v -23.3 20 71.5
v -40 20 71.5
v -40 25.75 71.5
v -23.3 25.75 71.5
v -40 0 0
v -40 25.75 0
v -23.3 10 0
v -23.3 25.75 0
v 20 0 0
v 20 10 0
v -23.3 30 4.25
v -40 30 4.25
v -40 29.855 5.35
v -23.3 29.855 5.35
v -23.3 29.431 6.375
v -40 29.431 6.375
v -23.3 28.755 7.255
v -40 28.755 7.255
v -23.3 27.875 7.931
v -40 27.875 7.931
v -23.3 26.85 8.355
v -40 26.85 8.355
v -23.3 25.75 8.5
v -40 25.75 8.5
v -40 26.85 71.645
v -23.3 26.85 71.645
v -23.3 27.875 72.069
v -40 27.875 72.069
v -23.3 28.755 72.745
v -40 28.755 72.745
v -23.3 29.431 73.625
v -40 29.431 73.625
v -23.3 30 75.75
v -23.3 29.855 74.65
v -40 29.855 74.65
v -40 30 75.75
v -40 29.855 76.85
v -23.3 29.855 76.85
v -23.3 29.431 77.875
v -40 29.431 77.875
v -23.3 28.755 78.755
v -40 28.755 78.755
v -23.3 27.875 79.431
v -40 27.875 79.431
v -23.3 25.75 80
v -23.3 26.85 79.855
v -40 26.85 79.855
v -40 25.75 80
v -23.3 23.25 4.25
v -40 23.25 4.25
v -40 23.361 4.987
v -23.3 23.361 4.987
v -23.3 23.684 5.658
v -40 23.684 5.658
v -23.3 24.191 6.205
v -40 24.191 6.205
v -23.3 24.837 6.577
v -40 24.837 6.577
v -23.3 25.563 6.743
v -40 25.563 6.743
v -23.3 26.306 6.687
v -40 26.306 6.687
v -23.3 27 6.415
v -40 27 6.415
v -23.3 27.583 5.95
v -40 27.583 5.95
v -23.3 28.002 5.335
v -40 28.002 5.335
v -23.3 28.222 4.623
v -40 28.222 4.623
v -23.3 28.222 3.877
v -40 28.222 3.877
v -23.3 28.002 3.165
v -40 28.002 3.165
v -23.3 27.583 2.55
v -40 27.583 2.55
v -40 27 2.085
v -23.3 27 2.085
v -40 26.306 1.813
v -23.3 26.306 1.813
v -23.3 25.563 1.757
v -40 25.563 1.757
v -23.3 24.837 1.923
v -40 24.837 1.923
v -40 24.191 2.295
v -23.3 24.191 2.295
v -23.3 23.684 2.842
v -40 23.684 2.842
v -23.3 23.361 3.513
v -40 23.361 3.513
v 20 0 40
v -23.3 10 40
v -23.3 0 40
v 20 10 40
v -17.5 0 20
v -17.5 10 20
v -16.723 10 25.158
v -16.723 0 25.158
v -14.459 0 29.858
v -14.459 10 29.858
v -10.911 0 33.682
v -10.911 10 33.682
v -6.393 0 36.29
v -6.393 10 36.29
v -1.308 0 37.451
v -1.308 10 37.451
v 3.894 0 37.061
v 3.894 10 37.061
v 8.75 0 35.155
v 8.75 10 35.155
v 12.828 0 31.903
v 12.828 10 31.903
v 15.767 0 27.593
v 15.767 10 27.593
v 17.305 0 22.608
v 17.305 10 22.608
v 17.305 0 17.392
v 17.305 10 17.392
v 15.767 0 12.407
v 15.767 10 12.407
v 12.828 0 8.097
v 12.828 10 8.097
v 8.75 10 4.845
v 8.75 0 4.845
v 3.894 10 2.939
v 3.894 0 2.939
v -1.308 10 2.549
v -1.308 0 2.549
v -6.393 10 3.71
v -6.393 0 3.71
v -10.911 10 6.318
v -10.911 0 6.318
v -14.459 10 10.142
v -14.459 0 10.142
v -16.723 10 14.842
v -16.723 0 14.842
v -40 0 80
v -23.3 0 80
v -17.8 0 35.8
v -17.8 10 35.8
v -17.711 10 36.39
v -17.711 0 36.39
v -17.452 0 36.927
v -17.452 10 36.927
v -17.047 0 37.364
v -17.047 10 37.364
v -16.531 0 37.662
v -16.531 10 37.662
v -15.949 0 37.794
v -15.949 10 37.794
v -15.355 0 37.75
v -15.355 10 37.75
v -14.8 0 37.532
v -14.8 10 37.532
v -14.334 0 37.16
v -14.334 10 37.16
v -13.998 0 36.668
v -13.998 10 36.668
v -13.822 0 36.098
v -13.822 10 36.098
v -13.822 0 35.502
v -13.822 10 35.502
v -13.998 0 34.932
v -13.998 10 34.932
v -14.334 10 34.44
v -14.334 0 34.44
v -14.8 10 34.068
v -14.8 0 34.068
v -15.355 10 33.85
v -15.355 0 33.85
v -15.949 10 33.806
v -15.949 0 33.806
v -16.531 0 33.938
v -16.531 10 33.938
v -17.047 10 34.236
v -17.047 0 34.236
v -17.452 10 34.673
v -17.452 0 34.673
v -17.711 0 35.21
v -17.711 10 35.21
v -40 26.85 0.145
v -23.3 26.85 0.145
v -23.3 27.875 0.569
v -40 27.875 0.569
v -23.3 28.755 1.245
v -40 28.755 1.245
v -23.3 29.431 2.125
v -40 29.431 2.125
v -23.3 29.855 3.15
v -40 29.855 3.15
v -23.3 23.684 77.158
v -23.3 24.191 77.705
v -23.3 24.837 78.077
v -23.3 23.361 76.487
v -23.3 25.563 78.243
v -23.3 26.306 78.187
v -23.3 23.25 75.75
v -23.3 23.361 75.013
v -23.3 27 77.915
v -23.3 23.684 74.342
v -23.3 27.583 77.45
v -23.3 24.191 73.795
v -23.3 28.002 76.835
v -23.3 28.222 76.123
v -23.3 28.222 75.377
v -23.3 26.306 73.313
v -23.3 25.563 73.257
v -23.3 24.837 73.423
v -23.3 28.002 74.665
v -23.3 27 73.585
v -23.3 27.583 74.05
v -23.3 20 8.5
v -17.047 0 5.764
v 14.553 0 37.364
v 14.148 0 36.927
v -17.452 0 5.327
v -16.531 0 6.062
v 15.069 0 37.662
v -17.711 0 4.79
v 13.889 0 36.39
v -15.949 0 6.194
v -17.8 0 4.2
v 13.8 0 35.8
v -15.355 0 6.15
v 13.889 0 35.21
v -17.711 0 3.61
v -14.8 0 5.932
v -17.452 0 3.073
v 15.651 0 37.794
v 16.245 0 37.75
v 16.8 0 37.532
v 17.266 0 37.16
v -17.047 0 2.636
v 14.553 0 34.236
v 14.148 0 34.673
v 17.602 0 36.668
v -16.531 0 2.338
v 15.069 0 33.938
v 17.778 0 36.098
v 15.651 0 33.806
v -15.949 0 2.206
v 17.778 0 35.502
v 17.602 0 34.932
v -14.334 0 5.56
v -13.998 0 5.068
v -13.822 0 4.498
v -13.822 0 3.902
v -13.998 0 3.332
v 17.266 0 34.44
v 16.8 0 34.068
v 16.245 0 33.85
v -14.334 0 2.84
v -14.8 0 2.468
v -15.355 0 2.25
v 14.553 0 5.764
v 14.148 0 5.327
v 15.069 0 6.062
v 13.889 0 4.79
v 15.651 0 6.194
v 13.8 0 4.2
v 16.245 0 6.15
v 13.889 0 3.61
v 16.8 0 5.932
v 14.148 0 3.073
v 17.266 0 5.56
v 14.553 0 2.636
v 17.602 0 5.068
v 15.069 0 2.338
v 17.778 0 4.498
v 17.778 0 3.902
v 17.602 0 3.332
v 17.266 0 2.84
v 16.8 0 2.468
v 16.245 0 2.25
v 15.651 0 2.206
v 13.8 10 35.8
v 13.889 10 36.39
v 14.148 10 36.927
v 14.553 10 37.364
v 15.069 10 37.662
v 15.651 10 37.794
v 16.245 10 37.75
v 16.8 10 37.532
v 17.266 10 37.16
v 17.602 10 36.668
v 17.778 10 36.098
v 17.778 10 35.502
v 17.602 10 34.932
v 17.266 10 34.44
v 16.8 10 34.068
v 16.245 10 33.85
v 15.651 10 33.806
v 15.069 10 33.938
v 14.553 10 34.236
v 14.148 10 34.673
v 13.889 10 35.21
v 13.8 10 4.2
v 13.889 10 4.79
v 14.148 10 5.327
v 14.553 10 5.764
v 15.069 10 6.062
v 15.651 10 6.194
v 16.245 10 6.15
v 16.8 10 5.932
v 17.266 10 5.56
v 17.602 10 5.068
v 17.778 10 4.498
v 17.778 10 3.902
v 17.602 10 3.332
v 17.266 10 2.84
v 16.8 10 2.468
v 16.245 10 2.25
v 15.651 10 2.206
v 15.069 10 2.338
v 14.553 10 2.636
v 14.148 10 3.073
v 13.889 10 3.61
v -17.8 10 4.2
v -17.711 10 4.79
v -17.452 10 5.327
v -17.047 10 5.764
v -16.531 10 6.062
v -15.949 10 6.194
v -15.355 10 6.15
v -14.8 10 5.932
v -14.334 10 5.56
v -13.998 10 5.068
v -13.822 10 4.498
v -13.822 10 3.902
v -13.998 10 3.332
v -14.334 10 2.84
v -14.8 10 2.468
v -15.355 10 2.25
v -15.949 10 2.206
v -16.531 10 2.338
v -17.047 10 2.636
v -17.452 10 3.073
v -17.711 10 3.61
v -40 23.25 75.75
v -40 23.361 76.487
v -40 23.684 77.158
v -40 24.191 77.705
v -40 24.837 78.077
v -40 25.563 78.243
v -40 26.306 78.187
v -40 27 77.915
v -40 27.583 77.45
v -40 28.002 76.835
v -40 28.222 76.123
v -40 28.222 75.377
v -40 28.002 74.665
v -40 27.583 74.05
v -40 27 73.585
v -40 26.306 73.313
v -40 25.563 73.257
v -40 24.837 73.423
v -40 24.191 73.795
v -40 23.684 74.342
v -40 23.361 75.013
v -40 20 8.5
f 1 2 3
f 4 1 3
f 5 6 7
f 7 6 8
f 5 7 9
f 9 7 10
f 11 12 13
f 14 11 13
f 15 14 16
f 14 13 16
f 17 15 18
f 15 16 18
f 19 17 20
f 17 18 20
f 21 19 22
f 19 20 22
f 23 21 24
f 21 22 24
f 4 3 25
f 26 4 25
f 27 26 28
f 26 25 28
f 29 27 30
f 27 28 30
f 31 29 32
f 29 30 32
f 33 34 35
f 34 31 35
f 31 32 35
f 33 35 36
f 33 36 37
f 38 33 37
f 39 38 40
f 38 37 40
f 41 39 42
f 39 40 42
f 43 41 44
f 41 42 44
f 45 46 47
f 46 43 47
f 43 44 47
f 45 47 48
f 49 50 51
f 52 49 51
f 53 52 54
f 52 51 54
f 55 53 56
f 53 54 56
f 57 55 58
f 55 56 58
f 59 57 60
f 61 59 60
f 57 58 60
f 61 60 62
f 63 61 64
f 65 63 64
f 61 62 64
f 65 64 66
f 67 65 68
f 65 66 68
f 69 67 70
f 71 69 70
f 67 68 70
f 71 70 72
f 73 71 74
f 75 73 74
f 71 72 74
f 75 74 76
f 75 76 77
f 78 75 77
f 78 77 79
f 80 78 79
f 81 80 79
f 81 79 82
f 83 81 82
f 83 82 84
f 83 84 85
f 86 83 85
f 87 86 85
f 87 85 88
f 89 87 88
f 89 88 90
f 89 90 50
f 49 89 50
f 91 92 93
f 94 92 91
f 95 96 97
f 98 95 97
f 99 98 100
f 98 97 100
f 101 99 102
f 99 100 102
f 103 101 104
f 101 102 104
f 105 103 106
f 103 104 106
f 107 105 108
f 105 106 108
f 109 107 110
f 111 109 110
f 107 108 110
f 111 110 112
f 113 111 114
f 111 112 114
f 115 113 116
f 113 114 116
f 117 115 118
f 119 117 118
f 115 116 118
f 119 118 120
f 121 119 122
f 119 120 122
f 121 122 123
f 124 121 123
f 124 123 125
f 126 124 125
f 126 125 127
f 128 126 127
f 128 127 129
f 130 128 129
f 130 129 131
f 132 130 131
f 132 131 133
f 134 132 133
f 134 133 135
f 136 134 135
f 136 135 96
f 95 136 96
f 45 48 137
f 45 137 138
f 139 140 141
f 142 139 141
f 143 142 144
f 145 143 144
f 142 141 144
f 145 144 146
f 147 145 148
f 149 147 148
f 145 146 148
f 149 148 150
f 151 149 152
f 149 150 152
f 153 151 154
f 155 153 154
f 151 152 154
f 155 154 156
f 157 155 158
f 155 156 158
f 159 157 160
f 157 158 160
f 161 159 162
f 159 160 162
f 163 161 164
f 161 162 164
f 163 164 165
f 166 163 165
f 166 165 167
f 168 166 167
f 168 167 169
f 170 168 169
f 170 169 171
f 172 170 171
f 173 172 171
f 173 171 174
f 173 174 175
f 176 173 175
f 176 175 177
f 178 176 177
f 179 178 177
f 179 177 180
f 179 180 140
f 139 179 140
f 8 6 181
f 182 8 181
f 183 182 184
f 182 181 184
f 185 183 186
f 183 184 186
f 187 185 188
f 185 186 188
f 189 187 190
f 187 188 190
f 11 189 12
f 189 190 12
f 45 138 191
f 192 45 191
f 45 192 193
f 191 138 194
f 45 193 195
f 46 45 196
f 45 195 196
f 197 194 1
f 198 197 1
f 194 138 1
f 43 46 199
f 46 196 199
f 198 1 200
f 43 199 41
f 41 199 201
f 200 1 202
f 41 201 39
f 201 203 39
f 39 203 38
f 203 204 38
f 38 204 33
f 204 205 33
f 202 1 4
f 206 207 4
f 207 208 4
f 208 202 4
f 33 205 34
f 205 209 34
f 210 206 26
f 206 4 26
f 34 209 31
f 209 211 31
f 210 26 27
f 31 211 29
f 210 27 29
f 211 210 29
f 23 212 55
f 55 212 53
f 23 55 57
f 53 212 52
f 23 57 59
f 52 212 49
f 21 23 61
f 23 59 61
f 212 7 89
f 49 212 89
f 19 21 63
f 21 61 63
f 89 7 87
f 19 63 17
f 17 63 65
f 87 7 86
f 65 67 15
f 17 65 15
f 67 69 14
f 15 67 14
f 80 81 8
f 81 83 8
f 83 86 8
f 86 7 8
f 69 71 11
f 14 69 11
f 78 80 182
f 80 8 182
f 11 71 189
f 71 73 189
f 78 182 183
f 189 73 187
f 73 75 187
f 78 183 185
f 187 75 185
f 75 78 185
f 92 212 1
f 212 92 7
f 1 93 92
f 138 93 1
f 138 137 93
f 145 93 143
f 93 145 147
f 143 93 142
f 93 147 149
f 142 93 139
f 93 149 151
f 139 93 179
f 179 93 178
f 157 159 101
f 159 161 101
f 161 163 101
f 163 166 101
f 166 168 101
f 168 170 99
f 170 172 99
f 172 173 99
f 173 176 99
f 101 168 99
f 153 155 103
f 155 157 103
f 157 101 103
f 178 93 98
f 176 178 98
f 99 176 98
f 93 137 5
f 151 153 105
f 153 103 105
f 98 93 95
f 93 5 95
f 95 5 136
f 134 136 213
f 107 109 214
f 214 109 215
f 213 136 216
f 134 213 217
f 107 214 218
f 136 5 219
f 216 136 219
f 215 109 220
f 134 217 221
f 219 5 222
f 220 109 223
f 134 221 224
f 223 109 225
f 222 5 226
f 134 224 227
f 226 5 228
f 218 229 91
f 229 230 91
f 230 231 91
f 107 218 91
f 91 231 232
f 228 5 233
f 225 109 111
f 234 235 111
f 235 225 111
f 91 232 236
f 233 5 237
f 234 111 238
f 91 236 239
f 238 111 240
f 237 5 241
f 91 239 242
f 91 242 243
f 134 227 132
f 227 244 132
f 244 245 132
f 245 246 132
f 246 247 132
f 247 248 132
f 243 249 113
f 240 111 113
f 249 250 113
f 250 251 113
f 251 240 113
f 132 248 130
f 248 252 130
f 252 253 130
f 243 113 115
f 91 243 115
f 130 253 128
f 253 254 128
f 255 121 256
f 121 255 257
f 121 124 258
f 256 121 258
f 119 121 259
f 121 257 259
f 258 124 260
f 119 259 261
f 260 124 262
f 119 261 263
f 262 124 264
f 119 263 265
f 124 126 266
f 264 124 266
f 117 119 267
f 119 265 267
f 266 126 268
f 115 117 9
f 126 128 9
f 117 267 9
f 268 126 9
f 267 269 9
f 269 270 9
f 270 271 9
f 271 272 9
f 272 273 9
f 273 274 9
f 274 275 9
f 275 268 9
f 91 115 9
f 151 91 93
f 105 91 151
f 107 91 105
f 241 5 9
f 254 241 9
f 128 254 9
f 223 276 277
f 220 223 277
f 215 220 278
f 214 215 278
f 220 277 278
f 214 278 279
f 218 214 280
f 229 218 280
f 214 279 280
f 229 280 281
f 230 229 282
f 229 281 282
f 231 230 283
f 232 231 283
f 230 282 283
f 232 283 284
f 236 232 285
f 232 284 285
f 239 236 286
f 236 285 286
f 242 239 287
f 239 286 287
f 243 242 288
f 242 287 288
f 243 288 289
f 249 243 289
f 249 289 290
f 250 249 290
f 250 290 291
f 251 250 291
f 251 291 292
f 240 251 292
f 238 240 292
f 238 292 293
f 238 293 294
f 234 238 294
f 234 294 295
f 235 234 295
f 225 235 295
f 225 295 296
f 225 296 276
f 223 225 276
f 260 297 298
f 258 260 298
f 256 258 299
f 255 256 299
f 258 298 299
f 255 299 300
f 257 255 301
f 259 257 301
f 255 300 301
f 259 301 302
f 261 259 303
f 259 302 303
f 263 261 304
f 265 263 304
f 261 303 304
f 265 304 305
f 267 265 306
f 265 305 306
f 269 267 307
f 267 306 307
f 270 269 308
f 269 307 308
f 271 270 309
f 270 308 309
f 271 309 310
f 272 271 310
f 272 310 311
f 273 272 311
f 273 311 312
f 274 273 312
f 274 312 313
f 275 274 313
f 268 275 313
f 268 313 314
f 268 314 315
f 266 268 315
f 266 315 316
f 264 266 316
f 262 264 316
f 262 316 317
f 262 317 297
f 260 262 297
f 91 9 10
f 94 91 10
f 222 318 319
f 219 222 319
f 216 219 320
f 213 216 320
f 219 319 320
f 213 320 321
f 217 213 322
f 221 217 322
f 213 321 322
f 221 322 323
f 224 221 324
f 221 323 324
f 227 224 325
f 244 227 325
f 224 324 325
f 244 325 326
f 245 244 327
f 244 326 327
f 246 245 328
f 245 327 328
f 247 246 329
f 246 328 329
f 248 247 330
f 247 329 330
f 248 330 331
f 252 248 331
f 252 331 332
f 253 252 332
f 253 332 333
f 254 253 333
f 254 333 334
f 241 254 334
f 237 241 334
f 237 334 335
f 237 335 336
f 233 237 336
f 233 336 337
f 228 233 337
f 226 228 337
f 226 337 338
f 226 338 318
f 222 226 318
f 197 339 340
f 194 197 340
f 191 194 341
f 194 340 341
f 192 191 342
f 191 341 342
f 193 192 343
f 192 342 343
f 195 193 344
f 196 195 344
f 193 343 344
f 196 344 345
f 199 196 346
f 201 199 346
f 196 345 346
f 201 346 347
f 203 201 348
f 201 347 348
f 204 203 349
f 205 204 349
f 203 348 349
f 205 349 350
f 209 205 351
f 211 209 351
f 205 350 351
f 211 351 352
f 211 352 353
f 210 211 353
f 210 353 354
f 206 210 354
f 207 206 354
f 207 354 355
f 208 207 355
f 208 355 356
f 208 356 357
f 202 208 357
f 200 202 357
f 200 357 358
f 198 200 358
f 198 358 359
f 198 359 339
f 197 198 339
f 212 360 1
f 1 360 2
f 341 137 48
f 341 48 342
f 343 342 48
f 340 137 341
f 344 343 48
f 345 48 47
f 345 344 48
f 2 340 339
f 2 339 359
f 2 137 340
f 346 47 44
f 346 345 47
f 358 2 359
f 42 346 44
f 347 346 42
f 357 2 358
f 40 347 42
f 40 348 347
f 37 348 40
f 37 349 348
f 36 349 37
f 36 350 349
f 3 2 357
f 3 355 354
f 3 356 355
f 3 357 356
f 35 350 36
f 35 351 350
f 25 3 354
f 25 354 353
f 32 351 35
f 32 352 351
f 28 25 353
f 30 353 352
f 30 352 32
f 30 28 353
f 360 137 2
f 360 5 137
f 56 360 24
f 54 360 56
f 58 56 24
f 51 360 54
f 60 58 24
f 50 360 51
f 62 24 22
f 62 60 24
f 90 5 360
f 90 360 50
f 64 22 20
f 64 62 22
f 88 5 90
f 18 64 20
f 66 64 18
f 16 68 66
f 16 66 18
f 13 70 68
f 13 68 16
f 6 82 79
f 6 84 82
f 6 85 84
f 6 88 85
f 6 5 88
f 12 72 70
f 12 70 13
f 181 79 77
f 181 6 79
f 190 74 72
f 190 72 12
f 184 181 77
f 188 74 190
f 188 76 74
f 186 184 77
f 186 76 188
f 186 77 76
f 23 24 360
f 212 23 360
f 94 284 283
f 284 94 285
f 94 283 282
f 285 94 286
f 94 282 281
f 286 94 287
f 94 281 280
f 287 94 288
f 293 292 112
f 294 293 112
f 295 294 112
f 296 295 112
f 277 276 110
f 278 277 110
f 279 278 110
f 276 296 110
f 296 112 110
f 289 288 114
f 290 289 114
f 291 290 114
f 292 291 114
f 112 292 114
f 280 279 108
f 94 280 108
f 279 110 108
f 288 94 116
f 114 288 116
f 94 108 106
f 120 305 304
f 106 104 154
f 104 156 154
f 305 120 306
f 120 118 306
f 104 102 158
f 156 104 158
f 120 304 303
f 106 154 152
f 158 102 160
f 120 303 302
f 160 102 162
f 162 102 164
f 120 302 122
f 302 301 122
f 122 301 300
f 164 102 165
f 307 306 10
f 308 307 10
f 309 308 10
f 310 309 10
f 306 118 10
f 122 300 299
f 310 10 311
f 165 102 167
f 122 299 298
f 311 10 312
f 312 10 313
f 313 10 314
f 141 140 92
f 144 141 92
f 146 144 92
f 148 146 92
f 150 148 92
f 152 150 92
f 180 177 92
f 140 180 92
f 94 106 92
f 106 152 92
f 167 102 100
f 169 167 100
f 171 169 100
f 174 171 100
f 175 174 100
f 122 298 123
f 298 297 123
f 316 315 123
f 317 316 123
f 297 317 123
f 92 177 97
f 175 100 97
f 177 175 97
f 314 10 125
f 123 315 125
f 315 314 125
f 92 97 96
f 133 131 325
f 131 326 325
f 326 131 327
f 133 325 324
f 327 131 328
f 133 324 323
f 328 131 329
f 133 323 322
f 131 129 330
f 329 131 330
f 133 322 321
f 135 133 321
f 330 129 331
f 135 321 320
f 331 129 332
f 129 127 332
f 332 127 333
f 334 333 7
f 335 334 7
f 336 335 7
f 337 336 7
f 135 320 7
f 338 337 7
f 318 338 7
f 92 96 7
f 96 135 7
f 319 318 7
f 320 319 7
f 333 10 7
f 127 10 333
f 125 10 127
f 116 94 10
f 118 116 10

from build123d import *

# Parameters (mm, degrees)
F1_DEPTH = 40
F0_W     = 16.7
F0_H     = 20
F2_DEPTH = 80
F3_R     = 2
F3_R_2   = 17.5
F4_DEPTH = 10.001
F5_R     = 2.5
F6_DEPTH = 60.001
F7_W     = 16.7
F7_H     = 10
F8_DEPTH = 40


with BuildPart() as f1:
    # F0 (on Top) → F1 (new body)
    with BuildSketch(Plane.XY):
        Polygon((-15.8, 10), (-20, 10), (-20, 0), (20, 0), (20, 10), (15.8, 10), align=None)
        Polygon((-23.3, 10), (-40, 10), (-40, 0), (-20, 0), (-20, 10), align=None)
    extrude(amount=F1_DEPTH)

    # F0 (on Top) → F2 (join)
    with BuildSketch(Plane.XY):
        with Locations((-31.65, 20)):
            Rectangle(F0_W, F0_H)
    extrude(amount=F2_DEPTH)

    # F3 (on face) → F4 (cut, through all)
    with BuildSketch(Plane(origin=(0, 10, 0), x_dir=(-1, 0, 0), z_dir=(0, 1, 0))):
        with Locations((-15.8, 4.2)):
            Circle(F3_R)
        with Locations((-15.8, 35.8)):
            Circle(F3_R)
        with Locations((15.8, 35.8)):
            Circle(F3_R)
        with Locations((15.8, 4.2)):
            Circle(F3_R)
        with Locations((0, 20)):
            Circle(F3_R_2)
    extrude(amount=-F4_DEPTH, mode=Mode.SUBTRACT)

    # F5 (on face) → F6 (cut, through all)
    with BuildSketch(Plane(origin=(-40, 0, 0), x_dir=(0, -1, 0), z_dir=(-1, 0, 0))):
        with Locations((-25.75, 75.75)):
            Circle(F5_R)
        with BuildLine():
            Line((-30, 80), (-30, 75.75))
            ThreePointArc((-30, 75.75), (-28.75520382, 78.75520382), (-25.75, 80))
            Line((-25.75, 80), (-30, 80))
        make_face()
        with BuildLine():
            Line((-20, 71.5), (-25.75, 71.5))
            ThreePointArc((-25.75, 71.5), (-28.75520382, 72.74479618), (-30, 75.75))
            Line((-30, 75.75), (-30, 4.2499999975))
            ThreePointArc((-30, 4.2499999975), (-28.7552038209, 7.2552038191), (-25.75, 8.5))
            Line((-25.75, 8.5), (-20, 8.5))
            Line((-20, 8.5), (-20, 71.5))
        make_face()
        with BuildLine():
            ThreePointArc((-25.75, 0), (-28.7552038191, 1.2447961791), (-30, 4.2499999975))
            Line((-30, 4.2499999975), (-30, 0))
            Line((-30, 0), (-25.75, 0))
        make_face()
        with Locations((-25.75, 4.25)):
            Circle(F5_R)
    extrude(amount=-F6_DEPTH, mode=Mode.SUBTRACT)

    # F7 (on face) → F8 (join, through all)
    with BuildSketch(Plane.XY.offset(40)):
        with Locations((-31.65, 5)):
            Rectangle(F7_W, F7_H)
    extrude(amount=F8_DEPTH)


solid = f1.part
